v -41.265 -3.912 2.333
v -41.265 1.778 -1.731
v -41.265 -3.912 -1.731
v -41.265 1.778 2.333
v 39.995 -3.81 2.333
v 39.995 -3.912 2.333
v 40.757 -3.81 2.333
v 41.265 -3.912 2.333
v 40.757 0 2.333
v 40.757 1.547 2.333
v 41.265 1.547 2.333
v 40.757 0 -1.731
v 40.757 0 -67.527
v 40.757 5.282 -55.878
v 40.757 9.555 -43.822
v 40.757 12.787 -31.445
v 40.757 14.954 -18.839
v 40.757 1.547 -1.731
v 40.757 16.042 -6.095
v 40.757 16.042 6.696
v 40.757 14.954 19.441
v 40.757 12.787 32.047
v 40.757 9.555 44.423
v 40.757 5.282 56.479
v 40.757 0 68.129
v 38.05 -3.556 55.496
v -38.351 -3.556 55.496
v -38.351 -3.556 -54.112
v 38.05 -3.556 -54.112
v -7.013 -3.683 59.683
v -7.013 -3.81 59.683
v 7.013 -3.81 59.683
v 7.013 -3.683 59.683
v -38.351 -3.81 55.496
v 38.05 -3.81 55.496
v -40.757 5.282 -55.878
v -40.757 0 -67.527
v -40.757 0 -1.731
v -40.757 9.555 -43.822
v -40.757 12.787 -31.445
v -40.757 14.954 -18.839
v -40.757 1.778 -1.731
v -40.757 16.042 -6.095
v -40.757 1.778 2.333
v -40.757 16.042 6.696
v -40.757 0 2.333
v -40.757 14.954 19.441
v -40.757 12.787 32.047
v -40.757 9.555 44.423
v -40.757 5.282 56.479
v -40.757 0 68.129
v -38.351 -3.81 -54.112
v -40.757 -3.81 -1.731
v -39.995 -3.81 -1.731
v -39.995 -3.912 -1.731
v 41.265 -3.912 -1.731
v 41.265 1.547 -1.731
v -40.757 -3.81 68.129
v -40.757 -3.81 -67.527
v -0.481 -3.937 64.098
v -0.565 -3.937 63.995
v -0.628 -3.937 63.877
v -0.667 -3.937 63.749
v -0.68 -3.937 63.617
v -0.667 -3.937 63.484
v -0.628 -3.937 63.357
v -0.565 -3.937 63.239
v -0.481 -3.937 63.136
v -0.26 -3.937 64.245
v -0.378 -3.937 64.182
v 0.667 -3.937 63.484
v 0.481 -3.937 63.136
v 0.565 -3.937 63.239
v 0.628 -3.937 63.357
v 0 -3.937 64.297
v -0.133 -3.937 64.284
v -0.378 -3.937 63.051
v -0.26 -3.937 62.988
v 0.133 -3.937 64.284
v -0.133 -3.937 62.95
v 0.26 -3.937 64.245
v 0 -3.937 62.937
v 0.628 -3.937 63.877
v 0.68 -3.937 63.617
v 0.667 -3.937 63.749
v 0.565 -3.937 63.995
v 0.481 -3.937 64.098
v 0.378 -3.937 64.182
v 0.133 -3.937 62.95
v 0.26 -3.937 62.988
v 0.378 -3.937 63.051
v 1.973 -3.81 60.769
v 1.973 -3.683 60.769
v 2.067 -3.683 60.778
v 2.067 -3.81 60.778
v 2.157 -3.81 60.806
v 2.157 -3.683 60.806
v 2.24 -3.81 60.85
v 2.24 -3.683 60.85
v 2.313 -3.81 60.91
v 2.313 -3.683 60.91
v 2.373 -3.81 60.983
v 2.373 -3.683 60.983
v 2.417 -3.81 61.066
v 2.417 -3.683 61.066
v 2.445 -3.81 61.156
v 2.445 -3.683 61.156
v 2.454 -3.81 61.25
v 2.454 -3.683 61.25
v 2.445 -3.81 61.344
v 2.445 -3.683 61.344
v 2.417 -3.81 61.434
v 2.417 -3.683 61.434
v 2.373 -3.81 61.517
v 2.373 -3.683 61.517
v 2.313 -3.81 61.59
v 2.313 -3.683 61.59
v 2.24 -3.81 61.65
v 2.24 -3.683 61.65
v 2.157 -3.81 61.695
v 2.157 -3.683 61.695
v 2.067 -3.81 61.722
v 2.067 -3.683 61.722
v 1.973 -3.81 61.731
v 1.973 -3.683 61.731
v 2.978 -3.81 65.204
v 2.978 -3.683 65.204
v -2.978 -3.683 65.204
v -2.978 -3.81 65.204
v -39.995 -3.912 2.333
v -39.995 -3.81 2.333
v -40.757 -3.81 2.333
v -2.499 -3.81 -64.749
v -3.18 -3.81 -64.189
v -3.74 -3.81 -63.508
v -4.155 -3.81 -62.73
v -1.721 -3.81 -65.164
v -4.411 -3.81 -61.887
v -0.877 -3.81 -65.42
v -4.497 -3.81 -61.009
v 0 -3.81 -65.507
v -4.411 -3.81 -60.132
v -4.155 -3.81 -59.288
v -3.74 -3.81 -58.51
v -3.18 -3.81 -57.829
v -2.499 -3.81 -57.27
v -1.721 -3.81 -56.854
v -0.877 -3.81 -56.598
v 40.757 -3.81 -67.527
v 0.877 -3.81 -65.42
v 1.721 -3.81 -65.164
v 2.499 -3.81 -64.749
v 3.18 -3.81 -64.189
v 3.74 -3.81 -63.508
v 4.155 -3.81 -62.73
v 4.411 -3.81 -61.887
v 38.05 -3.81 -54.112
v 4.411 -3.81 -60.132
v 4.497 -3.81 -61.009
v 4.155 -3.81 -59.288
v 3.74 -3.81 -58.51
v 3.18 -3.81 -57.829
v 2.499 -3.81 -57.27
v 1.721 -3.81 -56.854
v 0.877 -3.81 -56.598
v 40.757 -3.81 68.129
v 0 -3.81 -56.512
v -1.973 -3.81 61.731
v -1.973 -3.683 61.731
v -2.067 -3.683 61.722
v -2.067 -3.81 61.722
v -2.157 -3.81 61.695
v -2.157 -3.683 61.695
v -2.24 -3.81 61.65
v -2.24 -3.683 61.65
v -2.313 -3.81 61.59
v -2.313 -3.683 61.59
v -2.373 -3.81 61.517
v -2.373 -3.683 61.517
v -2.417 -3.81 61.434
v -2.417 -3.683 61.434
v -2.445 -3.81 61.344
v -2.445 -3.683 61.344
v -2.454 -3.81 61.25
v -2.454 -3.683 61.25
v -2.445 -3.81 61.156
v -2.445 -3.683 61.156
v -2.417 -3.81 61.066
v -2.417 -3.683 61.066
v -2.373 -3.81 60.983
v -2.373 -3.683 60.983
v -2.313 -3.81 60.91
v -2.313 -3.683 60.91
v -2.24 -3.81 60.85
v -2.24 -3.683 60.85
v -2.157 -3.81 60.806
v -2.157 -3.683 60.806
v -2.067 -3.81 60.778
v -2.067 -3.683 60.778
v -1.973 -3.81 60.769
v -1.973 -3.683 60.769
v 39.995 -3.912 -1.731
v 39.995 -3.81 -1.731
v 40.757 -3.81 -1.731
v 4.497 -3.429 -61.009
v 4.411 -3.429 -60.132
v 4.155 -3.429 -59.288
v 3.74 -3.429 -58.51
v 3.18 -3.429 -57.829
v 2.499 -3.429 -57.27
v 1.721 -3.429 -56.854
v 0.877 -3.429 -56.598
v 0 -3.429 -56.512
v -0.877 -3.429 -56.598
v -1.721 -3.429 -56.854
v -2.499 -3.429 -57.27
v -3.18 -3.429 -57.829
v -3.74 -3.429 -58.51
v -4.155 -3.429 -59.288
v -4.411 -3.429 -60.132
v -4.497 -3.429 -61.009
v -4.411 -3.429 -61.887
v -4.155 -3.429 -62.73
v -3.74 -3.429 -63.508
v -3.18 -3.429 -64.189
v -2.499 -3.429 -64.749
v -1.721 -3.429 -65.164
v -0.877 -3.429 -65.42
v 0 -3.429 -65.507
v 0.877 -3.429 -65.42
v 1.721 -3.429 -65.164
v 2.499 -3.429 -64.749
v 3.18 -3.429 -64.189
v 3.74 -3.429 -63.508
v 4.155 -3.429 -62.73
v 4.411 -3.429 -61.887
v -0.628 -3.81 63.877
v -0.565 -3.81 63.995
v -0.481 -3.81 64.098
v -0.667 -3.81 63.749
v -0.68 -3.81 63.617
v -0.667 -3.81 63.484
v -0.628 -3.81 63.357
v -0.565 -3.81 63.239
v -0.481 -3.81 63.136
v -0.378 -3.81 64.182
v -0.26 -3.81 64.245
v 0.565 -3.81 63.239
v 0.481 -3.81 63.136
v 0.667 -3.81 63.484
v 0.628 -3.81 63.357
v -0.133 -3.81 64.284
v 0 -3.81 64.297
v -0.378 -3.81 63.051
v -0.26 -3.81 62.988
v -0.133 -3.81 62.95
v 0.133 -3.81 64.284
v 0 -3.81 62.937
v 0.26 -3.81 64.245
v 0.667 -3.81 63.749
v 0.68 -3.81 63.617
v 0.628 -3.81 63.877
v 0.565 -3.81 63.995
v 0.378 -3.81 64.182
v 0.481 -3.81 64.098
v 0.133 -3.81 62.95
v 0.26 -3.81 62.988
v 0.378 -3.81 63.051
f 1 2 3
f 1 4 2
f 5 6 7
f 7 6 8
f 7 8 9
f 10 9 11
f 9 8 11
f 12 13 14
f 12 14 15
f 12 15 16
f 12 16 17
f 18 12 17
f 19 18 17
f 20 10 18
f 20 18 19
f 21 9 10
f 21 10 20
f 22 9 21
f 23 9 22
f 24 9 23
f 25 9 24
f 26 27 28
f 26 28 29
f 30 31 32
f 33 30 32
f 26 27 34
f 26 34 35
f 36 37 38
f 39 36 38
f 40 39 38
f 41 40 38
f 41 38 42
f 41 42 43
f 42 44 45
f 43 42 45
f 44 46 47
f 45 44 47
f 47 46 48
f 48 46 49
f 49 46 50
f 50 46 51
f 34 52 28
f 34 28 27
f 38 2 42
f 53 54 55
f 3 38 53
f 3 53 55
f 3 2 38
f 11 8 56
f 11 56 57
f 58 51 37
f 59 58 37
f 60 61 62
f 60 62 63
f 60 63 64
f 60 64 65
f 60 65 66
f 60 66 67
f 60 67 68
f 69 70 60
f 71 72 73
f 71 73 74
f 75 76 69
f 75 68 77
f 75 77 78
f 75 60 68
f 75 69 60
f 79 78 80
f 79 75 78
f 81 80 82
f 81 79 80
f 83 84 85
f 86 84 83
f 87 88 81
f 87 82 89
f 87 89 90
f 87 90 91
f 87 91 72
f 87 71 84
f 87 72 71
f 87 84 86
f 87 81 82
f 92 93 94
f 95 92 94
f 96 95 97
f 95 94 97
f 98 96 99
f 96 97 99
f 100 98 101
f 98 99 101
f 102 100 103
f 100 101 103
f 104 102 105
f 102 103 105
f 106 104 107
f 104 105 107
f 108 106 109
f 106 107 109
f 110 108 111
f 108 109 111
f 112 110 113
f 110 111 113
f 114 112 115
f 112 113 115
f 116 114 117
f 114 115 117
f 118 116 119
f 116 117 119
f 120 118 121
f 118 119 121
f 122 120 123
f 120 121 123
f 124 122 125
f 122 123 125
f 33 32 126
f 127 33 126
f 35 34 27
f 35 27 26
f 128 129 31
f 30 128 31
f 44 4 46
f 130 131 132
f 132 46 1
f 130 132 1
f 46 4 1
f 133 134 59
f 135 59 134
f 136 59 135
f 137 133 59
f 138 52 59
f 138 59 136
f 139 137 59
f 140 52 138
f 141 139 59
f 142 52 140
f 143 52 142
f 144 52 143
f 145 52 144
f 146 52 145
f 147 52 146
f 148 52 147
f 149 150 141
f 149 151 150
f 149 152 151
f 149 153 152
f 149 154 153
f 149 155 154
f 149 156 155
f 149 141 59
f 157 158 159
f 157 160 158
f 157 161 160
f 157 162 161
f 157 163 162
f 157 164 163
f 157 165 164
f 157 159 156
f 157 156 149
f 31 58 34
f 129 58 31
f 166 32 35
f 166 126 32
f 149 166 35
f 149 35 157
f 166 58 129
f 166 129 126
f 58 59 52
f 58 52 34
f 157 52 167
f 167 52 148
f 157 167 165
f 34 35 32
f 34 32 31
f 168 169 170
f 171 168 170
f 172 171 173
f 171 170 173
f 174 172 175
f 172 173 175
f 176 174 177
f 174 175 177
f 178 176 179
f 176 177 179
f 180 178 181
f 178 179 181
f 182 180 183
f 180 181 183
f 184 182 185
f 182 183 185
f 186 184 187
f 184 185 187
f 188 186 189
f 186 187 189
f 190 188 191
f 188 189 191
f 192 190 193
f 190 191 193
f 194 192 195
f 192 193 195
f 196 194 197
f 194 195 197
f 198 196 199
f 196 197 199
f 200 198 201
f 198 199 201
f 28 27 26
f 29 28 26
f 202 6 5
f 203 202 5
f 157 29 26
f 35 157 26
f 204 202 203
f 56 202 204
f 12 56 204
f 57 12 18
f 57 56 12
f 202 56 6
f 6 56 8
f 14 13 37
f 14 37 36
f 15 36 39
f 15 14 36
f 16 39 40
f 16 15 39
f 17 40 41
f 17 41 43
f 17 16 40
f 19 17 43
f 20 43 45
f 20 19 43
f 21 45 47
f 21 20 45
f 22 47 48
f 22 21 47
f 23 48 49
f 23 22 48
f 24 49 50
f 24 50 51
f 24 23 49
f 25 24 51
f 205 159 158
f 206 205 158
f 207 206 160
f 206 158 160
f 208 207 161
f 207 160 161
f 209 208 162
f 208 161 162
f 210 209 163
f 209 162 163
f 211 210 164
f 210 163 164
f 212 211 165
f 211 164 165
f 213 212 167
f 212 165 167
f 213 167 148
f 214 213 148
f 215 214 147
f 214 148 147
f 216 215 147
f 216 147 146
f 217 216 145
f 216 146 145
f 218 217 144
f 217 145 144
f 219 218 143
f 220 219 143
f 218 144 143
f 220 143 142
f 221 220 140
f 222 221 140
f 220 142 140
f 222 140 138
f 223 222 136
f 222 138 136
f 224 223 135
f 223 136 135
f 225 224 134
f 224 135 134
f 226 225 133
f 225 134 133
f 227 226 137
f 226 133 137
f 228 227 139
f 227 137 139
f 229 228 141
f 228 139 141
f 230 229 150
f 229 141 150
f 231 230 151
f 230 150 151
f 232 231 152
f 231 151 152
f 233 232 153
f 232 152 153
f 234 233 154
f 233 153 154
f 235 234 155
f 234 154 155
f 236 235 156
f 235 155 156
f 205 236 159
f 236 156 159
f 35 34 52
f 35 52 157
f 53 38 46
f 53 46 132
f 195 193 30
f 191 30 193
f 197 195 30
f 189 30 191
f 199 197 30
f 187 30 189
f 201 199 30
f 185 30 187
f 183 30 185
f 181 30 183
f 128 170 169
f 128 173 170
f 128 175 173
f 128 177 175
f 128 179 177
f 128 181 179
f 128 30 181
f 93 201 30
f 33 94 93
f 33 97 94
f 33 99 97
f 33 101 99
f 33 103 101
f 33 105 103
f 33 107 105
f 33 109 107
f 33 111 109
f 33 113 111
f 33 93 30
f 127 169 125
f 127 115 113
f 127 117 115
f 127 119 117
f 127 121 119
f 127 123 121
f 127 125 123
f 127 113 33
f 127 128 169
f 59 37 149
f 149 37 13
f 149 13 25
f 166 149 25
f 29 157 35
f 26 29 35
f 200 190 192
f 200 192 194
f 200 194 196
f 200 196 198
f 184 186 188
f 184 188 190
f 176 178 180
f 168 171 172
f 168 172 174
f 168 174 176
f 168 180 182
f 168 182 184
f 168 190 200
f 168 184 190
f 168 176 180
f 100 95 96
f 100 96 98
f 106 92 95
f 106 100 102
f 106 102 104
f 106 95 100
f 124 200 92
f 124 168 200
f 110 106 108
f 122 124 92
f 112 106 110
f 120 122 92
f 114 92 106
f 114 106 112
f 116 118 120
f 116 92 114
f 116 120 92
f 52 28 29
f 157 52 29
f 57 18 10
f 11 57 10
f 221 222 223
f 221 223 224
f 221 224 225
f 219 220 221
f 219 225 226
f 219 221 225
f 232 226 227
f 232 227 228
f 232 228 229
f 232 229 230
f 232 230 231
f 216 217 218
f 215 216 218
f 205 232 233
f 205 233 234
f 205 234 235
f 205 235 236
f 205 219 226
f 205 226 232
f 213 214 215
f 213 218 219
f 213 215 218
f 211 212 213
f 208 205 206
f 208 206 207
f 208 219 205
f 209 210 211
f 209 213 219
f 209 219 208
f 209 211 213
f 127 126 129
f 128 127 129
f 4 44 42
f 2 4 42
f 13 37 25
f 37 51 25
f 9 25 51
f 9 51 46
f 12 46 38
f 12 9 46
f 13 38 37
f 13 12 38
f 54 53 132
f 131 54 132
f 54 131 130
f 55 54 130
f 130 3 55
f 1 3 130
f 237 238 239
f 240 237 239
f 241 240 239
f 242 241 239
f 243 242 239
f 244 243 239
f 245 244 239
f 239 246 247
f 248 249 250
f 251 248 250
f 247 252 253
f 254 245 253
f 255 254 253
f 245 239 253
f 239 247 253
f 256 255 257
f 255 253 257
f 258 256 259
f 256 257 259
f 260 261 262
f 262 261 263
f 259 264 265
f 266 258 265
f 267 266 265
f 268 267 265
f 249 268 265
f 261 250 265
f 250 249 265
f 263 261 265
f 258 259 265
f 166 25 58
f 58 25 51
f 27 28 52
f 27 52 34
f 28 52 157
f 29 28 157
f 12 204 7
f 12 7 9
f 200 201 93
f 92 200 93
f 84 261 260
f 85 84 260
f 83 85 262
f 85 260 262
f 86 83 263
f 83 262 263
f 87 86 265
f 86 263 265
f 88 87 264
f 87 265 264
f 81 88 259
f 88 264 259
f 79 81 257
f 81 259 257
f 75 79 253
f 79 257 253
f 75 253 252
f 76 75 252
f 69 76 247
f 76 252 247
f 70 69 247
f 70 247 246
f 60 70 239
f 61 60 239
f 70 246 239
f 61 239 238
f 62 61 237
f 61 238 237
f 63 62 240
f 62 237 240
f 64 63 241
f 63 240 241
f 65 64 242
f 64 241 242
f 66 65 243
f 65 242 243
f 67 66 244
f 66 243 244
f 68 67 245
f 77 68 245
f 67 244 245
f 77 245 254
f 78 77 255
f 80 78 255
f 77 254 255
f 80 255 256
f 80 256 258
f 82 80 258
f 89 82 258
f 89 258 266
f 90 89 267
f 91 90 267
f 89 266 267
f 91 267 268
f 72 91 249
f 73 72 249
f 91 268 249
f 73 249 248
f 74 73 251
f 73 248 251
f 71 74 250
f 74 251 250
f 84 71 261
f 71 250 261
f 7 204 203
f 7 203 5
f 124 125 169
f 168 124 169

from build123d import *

# Parameters (mm, degrees)
F1_DEPTH  = 3.81
F2_W      = 76.4005258679
F2_H      = 109.6077784896
F3_DEPTH  = 0.254
F4_W      = 76.4005258679
F4_H      = 109.6077784896
F5_DEPTH  = 0.254
F6_R      = 0.6800962697
F7_DEPTH  = 0.127
F8_DEPTH  = 0.127
F9_DEPTH  = 0.127
F2_R      = 4.4974633364
F10_DEPTH = 0.381
F12_DEPTH = 81.5139375627
F14_DEPTH = 0.127
F15_W     = 3.81
F15_H     = 4.064
F16_DEPTH = 0.508
F17_W     = 0.1016
F17_H     = 4.064
F18_DEPTH = 1.27
F20_DEPTH = 0.508
F21_W     = 0.1016
F21_H     = 4.064
F22_DEPTH = 1.27


with BuildPart() as f1:
    # F0 (on Front) → F1 (new body)
    with BuildSketch(Plane.XZ):
        Polygon((-40.7569687814, -67.5272345543), (0, -67.5272345543), (40.7569687814, -67.5272345543), (40.7569687814, 68.1288167834), (0, 68.1288167834), (-40.7569687814, 68.1288167834), align=None)
    extrude(amount=F1_DEPTH)

    # F2 (on face) → F3 (cut)
    with BuildSketch(Plane.XZ.offset(3.81)):
        with Locations((-0.1503936946, 0.691767782)):
            Rectangle(F2_W, F2_H)
    extrude(amount=-F3_DEPTH, mode=Mode.SUBTRACT)

    # F6 (on face) → F7 (cut)
    with BuildSketch(Plane.XZ.offset(3.81)):
        Polygon((2.9781554878, 65.2042552829), (0, 65.2042552829), (-2.9781554878, 65.2042552829), (-7.0130091316, 59.6828758717), (0, 59.6828758717), (7.0130091316, 59.6828758717), align=None)
        with Locations((0, 63.6167749763)):
            Circle(F6_R, mode=Mode.SUBTRACT)
    extrude(amount=-F7_DEPTH, mode=Mode.SUBTRACT)

    # F8 (cut): a face of the model
    f8_faces = [f1.faces().sort_by_distance(p)[0] for p in [
        (0, -3.81, 63.6167749763),
    ]]
    extrude(f8_faces, amount=-F8_DEPTH, mode=Mode.SUBTRACT)

    # F2 (on face) → F10 (cut)
    with BuildSketch(Plane.XZ.offset(3.81)):
        with Locations((0, -61.009131372)):
            Circle(F2_R)
    extrude(amount=-F10_DEPTH, mode=Mode.SUBTRACT)

    # F13 (on face) → F14 (join)
    with BuildSketch(Plane.XZ.offset(3.683)):
        with BuildLine():
            Line((1.9728252664, 61.7312639952), (0, 61.7312639952))
            Line((0, 61.7312639952), (-1.9728252664, 61.7312639952))
            ThreePointArc((-1.9728252664, 61.7312639952), (-2.4538422003, 61.2502470613), (-1.9728252664, 60.7692301273))
            Line((-1.9728252664, 60.7692301273), (0, 60.7692301273))
            Line((0, 60.7692301273), (1.9728252664, 60.7692301273))
            ThreePointArc((1.9728252664, 60.7692301273), (2.4538422003, 61.2502470613), (1.9728252664, 61.7312639952))
        make_face()
    extrude(amount=F14_DEPTH)


with BuildPart() as f5:
    # F4 (on face) → F5 (new body)
    with BuildSketch(Plane.XZ.offset(3.556)):
        with Locations((-0.1503936946, 0.691767782)):
            Rectangle(F4_W, F4_H)
    extrude(amount=F5_DEPTH)


with BuildPart() as f9:
    # F6 (on face) → F9 (new body)
    with BuildSketch(Plane.XZ.offset(3.81)):
        with Locations((0, 63.6167749763)):
            Circle(F6_R)
    extrude(amount=F9_DEPTH)


with BuildPart() as f12:
    # F11 (on face) → F12 (new body, through all)
    with BuildSketch(Plane.YZ.offset(40.7569687814)):
        with BuildLine():
            Line((0, 68.1288167834), (0, -67.5272345543))
            ThreePointArc((0, -67.5272345543), (16.1784054614, 0.3007911146), (0, 68.1288167834))
        make_face()
    extrude(amount=-F12_DEPTH)

    # F15 (on face) → F16 (join)
    with BuildSketch(Plane.YZ.offset(40.7569687814)):
        with Locations((-1.905, 0.3007911146)):
            Rectangle(F15_W, F15_H)
        Polygon((1.5467249905, -1.7312088854), (1.5467249905, 0.3007911146), (1.5467249905, 2.3327911146), (0, 2.3327911146), (0, -1.7312088854), align=None)
    extrude(amount=F16_DEPTH)

    # F17 (on face) → F18 (join)
    with BuildSketch(Plane.YZ.offset(41.2649687814)):
        with Locations((-3.8608, 0.3007911146)):
            Rectangle(F17_W, F17_H)
    extrude(amount=-F18_DEPTH)

    # F19 (on face) → F20 (join)
    with BuildSketch(Plane(origin=(-40.7569687814, 0, 0), x_dir=(0, -1, 0), z_dir=(-1, 0, 0))):
        Polygon((0, -1.7312088854), (0, 2.3327911146), (-1.778, 2.3327911146), (-1.778, 0.3007911146), (-1.778, -1.7312088854), align=None)
        Polygon((3.81, -1.7312088854), (3.81, 0.3007911146), (3.81, 2.3327911146), (0, 2.3327911146), (0, -1.7312088854), align=None)
    extrude(amount=F20_DEPTH)

    # F21 (on face) → F22 (join)
    with BuildSketch(Plane(origin=(-41.2649687814, 0, 0), x_dir=(0, -1, 0), z_dir=(-1, 0, 0))):
        with Locations((3.8608, 0.3007911146)):
            Rectangle(F21_W, F21_H)
    extrude(amount=-F22_DEPTH)


solid = Compound([f1.part, f5.part, f9.part, f12.part])
